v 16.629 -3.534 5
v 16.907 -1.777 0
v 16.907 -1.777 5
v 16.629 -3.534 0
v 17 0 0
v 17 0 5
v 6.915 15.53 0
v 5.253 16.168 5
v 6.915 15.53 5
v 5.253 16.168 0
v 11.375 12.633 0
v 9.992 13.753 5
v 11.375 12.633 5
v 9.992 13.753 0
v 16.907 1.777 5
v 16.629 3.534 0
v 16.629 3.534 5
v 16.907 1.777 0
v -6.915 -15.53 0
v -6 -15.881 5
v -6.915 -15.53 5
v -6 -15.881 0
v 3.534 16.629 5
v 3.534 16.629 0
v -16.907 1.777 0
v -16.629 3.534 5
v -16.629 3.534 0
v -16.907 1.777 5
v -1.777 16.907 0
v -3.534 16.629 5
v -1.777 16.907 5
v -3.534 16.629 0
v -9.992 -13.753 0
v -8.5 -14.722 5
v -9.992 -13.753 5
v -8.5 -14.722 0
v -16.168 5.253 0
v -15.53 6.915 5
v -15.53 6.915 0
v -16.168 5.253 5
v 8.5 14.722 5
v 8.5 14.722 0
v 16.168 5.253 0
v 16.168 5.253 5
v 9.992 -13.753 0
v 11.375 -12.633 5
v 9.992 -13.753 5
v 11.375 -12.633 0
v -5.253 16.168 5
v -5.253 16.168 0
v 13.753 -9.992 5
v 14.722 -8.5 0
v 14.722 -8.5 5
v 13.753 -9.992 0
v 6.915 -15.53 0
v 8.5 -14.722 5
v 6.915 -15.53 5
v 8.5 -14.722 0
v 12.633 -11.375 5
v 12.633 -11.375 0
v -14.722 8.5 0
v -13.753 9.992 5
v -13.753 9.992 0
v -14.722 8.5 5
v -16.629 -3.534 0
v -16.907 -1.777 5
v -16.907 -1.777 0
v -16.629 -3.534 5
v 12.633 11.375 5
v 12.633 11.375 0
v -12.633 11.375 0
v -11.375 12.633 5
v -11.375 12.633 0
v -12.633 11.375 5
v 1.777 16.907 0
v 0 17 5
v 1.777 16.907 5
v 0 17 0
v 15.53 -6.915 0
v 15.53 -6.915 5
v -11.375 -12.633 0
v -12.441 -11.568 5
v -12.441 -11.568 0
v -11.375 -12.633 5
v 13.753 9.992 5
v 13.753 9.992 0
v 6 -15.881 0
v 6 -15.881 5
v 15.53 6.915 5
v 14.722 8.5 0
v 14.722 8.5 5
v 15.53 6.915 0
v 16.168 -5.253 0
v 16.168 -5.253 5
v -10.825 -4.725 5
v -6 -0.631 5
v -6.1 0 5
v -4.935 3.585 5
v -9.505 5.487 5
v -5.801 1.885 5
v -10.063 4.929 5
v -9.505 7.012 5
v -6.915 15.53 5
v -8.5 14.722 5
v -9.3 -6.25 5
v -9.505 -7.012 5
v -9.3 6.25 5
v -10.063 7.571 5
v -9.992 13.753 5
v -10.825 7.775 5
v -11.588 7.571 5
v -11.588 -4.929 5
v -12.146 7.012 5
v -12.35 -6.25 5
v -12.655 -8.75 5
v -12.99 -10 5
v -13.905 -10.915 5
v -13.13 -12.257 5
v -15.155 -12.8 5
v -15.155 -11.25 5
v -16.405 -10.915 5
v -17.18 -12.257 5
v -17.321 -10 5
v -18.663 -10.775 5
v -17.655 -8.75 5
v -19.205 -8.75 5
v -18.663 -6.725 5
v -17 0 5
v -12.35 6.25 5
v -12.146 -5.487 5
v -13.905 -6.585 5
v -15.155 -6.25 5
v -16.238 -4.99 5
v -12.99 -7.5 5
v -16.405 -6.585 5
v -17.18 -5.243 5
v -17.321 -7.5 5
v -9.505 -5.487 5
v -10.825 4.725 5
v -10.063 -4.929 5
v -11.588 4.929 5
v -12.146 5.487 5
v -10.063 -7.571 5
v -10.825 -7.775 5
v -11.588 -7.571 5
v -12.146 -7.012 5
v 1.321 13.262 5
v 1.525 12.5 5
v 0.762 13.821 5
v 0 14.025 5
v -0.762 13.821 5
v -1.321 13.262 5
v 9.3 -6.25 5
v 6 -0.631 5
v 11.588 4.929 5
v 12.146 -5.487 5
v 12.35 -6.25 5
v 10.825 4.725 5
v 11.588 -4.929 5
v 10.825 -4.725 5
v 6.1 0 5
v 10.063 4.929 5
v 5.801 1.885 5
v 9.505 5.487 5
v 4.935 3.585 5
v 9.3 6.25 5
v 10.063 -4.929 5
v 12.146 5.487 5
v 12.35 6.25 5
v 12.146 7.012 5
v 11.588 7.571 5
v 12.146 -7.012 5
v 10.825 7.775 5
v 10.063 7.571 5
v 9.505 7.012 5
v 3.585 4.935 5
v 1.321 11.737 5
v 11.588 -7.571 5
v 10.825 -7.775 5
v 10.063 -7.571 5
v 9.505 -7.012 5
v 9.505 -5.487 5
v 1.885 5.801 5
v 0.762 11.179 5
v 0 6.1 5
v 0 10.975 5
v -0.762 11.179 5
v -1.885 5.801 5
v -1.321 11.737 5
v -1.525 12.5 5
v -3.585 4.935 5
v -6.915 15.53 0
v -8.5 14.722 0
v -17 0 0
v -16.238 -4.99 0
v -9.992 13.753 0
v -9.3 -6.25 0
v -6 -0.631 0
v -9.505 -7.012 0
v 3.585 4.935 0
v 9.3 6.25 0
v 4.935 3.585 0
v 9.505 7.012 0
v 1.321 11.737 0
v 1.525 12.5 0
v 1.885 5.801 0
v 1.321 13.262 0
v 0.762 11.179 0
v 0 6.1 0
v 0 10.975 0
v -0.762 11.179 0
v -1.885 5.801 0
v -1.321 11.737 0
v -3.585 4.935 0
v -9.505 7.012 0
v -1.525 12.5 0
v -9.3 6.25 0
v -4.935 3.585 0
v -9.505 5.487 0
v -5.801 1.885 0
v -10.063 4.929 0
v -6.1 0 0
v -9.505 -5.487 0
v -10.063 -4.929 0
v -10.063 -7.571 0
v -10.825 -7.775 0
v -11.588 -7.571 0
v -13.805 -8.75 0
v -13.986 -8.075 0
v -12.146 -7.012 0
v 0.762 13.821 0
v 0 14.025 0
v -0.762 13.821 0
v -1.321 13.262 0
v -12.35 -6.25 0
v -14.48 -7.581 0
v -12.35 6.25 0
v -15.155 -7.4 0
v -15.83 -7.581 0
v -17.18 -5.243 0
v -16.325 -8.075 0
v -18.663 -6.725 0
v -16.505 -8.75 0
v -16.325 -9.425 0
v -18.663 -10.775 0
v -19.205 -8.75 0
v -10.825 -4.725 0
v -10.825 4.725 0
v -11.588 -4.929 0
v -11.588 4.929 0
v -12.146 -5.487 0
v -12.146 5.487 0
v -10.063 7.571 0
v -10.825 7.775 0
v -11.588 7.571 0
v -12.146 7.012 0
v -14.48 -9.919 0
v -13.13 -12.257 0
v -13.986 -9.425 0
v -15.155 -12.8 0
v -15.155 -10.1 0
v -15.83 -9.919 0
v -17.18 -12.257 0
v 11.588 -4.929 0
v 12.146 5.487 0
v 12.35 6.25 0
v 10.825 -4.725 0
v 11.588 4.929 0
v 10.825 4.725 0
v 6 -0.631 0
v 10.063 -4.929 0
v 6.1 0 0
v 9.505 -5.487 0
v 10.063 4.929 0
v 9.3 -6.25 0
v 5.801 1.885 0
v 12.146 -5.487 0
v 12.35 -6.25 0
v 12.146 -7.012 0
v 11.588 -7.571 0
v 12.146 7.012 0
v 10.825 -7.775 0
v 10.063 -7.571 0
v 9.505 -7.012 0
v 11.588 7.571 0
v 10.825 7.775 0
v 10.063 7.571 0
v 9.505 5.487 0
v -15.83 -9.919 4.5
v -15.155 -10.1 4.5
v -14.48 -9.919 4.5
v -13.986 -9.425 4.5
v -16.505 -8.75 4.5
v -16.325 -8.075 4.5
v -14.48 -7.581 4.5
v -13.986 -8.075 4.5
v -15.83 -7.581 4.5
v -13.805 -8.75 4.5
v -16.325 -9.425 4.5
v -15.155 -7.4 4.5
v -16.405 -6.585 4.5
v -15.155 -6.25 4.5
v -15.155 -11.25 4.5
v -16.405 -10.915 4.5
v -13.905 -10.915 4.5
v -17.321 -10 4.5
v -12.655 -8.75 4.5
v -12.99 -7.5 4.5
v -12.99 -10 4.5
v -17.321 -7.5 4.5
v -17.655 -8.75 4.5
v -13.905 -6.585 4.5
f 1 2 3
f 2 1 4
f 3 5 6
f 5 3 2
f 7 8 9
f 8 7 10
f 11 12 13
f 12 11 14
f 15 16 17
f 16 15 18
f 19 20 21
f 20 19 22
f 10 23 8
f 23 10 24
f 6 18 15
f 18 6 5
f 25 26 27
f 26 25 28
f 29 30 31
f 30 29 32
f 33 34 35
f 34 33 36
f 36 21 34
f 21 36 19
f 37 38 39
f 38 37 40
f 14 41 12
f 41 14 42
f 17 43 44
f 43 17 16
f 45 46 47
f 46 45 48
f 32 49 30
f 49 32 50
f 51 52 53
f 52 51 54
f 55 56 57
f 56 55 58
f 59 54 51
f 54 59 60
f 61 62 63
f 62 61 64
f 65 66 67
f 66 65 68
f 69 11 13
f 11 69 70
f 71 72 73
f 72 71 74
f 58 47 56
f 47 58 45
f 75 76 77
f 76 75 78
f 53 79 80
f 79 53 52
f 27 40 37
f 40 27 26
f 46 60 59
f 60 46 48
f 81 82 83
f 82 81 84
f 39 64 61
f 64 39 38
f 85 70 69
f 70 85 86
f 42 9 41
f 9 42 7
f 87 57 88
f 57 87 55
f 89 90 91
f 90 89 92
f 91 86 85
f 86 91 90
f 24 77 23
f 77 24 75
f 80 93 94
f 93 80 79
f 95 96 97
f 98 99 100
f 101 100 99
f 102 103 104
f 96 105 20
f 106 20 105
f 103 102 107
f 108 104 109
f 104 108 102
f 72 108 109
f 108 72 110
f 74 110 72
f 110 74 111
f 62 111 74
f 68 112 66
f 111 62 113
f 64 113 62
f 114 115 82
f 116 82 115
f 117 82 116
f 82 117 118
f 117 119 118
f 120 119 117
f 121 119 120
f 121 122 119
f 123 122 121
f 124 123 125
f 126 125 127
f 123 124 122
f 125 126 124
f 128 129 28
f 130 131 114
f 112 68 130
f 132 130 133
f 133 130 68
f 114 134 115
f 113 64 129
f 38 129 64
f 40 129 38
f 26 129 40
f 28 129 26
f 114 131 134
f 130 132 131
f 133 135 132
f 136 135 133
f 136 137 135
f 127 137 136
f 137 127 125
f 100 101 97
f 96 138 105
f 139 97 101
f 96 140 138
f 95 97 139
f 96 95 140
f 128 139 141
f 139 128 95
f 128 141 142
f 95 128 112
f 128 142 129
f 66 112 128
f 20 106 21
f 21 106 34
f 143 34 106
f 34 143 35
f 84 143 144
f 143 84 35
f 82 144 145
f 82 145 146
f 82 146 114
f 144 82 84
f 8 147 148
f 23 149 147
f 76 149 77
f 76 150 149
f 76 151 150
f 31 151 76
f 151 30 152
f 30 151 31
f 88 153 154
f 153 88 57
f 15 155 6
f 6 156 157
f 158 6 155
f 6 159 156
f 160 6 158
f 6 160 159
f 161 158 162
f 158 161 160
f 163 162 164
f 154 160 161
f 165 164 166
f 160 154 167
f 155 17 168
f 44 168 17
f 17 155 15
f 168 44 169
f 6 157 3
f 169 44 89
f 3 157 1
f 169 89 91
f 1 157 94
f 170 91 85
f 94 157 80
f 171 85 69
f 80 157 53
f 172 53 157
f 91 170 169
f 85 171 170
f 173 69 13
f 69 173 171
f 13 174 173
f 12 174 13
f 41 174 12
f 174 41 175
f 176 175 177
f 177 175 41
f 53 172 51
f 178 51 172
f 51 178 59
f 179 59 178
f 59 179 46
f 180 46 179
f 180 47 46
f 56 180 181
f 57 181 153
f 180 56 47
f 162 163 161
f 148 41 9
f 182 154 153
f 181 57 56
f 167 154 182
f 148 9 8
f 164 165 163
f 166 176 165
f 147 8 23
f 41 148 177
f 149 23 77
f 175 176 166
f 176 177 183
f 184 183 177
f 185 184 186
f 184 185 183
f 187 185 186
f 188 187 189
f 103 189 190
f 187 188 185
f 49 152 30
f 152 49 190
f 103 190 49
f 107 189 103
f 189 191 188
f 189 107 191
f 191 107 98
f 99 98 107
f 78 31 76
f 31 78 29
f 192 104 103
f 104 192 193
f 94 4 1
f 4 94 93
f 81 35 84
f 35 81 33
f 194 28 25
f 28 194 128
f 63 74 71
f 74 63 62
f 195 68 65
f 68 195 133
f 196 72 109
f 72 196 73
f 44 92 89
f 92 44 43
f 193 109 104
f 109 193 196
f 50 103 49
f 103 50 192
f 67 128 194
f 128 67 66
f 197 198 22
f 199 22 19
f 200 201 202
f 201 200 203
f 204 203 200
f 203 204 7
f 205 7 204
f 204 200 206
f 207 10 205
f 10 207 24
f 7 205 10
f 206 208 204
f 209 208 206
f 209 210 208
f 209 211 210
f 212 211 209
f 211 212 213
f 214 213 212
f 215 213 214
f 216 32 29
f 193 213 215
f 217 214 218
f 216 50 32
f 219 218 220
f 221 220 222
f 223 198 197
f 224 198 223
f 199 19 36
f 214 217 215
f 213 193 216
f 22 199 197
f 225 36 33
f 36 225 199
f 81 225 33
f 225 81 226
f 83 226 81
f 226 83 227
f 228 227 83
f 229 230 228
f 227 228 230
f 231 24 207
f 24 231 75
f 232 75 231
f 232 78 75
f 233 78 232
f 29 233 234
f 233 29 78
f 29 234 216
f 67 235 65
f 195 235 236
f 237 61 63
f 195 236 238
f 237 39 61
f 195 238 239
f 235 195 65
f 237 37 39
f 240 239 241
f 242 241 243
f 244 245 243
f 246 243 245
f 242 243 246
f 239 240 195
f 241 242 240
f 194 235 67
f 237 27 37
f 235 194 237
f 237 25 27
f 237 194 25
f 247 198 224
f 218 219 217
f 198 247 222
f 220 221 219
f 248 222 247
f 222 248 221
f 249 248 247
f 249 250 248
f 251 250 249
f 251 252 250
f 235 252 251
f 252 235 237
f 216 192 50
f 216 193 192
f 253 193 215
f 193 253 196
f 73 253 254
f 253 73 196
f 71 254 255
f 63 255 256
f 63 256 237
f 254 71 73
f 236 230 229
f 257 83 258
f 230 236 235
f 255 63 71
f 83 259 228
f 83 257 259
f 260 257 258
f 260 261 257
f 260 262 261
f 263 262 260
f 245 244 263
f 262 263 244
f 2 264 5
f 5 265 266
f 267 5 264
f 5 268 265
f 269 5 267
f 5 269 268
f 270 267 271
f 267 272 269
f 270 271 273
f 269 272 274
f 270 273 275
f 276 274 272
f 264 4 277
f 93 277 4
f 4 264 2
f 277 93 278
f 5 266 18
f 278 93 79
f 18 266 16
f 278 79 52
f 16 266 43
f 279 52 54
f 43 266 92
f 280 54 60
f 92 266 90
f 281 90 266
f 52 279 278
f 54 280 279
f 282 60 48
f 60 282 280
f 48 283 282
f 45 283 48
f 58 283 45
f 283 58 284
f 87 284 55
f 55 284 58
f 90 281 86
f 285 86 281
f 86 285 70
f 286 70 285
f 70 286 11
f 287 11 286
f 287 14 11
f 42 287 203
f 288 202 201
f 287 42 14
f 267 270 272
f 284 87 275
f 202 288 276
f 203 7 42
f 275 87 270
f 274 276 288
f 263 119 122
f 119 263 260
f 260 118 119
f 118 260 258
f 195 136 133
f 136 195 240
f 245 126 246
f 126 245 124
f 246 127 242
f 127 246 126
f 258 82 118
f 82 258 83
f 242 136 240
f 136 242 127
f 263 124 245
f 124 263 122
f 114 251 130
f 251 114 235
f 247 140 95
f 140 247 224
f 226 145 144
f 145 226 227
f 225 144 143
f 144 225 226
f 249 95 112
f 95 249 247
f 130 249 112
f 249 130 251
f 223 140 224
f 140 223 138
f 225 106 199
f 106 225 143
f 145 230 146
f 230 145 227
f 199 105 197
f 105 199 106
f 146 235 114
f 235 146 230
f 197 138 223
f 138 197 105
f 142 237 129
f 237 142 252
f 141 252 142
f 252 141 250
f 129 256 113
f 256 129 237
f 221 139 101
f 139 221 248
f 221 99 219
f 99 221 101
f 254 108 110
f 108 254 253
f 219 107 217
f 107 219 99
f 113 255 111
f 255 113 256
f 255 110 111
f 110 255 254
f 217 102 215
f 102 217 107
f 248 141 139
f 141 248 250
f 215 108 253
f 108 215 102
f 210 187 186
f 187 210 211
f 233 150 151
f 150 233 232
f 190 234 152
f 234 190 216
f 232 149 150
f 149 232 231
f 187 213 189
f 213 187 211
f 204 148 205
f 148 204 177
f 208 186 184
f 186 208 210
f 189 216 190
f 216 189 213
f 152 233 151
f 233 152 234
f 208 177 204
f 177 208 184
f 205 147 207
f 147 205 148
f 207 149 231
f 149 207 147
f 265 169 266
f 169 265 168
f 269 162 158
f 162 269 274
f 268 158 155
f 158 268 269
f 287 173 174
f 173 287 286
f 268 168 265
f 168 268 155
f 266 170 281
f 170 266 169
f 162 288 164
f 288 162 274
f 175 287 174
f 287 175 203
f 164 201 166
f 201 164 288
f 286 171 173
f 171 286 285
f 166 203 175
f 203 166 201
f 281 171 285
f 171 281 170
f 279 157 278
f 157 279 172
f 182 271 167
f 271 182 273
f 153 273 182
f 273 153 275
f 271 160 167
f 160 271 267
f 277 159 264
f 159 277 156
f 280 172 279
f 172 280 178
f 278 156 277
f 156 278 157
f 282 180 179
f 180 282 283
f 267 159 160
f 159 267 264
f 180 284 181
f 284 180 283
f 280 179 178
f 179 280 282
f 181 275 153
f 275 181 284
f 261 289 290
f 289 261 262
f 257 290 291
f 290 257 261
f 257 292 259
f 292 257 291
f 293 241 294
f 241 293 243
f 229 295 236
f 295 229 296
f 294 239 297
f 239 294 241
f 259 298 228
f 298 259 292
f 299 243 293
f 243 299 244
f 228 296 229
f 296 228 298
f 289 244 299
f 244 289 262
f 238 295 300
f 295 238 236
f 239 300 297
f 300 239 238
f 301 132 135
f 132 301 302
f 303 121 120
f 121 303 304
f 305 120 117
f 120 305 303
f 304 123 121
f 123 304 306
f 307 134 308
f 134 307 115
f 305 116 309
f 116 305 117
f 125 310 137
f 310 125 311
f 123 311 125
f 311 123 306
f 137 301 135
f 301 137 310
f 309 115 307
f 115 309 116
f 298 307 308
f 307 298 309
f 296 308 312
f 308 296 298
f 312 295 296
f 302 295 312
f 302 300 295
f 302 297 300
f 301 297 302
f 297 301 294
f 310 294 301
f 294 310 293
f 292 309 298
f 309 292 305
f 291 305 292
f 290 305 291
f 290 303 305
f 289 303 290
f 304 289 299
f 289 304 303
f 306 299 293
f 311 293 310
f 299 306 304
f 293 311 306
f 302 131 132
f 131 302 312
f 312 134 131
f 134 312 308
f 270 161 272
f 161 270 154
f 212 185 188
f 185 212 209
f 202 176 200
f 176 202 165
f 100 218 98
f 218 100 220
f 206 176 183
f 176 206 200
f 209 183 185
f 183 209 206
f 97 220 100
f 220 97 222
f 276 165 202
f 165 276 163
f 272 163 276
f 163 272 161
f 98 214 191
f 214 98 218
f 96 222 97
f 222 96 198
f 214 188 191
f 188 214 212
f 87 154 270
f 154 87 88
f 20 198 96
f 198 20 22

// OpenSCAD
// file: configuration.scad
// Increase this if your slicer or printer make holes too tight.
extra_radius = 0.1;

// OD = outside diameter, corner to corner.
m3_nut_od = 6.1;
m3_nut_radius = m3_nut_od/2 + 0.2 + extra_radius;
m3_washer_radius = 3.5 + extra_radius;

// Major diameter of metric 3mm thread.
m3_major = 2.85;
m3_radius = m3_major/2 + extra_radius;
m3_wide_radius = m3_major/2 + extra_radius + 0.2;

// NEMA17 stepper motors.
motor_shaft_diameter = 5;
motor_shaft_radius = motor_shaft_diameter/2 + extra_radius;

// Frame brackets. M3x8mm screws work best with 3.6 mm brackets.
thickness = 3.6;

// OpenBeam or Misumi. Currently only 15x15 mm, but there is a plan
// to make models more parametric and allow 20x20 mm in the future.
extrusion = 15;

// Placement for the NEMA17 stepper motors.
motor_offset = 44;
motor_length = 47;

probe_tunnel_radius = 1.25 + extra_radius;
probe_excentricity = 5;
// main file
include <configuration.scad>;

offset = 20;  // Same as DELTA_EFFECTOR_OFFSET in Marlin.
mount_radius = 12.5;  // Hotend mounting screws, standard would be 25mm.
height = 5;

groove_radius = 6;
groove_height = 4.6;

probe_angle = 60;
probe_spring_radius = 2.5;


module retainer() {
  difference() {
    union() {
      cylinder(r=offset-3, h=height, center=true, $fn=60);
      rotate([0, 0, probe_angle]) {
        translate([0, mount_radius+probe_excentricity, 0])
          cylinder(r=probe_tunnel_radius*3, h=height, center=true, $fn=12);
      }
    }
    cylinder(r=groove_radius + extra_radius, h=height+1, center=true);
    for (a = [0:60:359]) rotate([0, 0, a]) {
      translate([0, mount_radius, 0])
        cylinder(r=m3_radius, h=2*height, center=true, $fn=12);
    }
    rotate([0, 0, probe_angle]) {
      translate([0, mount_radius+probe_excentricity, 0])
        union() {
          cylinder(r=probe_tunnel_radius, h=2*height, center=true, $fn=12);
          translate([0, 0, -height/2])
            cylinder(r=probe_spring_radius, h=1, center=true, $fn=12);
        }
    }
    // Groove mount insert slot.
    translate([0, 10, 0])
      cube([2*groove_radius, 20, 20], center=true);
  }
}

translate([0, 0, height/2])
rotate([180,0,0])
  retainer();
